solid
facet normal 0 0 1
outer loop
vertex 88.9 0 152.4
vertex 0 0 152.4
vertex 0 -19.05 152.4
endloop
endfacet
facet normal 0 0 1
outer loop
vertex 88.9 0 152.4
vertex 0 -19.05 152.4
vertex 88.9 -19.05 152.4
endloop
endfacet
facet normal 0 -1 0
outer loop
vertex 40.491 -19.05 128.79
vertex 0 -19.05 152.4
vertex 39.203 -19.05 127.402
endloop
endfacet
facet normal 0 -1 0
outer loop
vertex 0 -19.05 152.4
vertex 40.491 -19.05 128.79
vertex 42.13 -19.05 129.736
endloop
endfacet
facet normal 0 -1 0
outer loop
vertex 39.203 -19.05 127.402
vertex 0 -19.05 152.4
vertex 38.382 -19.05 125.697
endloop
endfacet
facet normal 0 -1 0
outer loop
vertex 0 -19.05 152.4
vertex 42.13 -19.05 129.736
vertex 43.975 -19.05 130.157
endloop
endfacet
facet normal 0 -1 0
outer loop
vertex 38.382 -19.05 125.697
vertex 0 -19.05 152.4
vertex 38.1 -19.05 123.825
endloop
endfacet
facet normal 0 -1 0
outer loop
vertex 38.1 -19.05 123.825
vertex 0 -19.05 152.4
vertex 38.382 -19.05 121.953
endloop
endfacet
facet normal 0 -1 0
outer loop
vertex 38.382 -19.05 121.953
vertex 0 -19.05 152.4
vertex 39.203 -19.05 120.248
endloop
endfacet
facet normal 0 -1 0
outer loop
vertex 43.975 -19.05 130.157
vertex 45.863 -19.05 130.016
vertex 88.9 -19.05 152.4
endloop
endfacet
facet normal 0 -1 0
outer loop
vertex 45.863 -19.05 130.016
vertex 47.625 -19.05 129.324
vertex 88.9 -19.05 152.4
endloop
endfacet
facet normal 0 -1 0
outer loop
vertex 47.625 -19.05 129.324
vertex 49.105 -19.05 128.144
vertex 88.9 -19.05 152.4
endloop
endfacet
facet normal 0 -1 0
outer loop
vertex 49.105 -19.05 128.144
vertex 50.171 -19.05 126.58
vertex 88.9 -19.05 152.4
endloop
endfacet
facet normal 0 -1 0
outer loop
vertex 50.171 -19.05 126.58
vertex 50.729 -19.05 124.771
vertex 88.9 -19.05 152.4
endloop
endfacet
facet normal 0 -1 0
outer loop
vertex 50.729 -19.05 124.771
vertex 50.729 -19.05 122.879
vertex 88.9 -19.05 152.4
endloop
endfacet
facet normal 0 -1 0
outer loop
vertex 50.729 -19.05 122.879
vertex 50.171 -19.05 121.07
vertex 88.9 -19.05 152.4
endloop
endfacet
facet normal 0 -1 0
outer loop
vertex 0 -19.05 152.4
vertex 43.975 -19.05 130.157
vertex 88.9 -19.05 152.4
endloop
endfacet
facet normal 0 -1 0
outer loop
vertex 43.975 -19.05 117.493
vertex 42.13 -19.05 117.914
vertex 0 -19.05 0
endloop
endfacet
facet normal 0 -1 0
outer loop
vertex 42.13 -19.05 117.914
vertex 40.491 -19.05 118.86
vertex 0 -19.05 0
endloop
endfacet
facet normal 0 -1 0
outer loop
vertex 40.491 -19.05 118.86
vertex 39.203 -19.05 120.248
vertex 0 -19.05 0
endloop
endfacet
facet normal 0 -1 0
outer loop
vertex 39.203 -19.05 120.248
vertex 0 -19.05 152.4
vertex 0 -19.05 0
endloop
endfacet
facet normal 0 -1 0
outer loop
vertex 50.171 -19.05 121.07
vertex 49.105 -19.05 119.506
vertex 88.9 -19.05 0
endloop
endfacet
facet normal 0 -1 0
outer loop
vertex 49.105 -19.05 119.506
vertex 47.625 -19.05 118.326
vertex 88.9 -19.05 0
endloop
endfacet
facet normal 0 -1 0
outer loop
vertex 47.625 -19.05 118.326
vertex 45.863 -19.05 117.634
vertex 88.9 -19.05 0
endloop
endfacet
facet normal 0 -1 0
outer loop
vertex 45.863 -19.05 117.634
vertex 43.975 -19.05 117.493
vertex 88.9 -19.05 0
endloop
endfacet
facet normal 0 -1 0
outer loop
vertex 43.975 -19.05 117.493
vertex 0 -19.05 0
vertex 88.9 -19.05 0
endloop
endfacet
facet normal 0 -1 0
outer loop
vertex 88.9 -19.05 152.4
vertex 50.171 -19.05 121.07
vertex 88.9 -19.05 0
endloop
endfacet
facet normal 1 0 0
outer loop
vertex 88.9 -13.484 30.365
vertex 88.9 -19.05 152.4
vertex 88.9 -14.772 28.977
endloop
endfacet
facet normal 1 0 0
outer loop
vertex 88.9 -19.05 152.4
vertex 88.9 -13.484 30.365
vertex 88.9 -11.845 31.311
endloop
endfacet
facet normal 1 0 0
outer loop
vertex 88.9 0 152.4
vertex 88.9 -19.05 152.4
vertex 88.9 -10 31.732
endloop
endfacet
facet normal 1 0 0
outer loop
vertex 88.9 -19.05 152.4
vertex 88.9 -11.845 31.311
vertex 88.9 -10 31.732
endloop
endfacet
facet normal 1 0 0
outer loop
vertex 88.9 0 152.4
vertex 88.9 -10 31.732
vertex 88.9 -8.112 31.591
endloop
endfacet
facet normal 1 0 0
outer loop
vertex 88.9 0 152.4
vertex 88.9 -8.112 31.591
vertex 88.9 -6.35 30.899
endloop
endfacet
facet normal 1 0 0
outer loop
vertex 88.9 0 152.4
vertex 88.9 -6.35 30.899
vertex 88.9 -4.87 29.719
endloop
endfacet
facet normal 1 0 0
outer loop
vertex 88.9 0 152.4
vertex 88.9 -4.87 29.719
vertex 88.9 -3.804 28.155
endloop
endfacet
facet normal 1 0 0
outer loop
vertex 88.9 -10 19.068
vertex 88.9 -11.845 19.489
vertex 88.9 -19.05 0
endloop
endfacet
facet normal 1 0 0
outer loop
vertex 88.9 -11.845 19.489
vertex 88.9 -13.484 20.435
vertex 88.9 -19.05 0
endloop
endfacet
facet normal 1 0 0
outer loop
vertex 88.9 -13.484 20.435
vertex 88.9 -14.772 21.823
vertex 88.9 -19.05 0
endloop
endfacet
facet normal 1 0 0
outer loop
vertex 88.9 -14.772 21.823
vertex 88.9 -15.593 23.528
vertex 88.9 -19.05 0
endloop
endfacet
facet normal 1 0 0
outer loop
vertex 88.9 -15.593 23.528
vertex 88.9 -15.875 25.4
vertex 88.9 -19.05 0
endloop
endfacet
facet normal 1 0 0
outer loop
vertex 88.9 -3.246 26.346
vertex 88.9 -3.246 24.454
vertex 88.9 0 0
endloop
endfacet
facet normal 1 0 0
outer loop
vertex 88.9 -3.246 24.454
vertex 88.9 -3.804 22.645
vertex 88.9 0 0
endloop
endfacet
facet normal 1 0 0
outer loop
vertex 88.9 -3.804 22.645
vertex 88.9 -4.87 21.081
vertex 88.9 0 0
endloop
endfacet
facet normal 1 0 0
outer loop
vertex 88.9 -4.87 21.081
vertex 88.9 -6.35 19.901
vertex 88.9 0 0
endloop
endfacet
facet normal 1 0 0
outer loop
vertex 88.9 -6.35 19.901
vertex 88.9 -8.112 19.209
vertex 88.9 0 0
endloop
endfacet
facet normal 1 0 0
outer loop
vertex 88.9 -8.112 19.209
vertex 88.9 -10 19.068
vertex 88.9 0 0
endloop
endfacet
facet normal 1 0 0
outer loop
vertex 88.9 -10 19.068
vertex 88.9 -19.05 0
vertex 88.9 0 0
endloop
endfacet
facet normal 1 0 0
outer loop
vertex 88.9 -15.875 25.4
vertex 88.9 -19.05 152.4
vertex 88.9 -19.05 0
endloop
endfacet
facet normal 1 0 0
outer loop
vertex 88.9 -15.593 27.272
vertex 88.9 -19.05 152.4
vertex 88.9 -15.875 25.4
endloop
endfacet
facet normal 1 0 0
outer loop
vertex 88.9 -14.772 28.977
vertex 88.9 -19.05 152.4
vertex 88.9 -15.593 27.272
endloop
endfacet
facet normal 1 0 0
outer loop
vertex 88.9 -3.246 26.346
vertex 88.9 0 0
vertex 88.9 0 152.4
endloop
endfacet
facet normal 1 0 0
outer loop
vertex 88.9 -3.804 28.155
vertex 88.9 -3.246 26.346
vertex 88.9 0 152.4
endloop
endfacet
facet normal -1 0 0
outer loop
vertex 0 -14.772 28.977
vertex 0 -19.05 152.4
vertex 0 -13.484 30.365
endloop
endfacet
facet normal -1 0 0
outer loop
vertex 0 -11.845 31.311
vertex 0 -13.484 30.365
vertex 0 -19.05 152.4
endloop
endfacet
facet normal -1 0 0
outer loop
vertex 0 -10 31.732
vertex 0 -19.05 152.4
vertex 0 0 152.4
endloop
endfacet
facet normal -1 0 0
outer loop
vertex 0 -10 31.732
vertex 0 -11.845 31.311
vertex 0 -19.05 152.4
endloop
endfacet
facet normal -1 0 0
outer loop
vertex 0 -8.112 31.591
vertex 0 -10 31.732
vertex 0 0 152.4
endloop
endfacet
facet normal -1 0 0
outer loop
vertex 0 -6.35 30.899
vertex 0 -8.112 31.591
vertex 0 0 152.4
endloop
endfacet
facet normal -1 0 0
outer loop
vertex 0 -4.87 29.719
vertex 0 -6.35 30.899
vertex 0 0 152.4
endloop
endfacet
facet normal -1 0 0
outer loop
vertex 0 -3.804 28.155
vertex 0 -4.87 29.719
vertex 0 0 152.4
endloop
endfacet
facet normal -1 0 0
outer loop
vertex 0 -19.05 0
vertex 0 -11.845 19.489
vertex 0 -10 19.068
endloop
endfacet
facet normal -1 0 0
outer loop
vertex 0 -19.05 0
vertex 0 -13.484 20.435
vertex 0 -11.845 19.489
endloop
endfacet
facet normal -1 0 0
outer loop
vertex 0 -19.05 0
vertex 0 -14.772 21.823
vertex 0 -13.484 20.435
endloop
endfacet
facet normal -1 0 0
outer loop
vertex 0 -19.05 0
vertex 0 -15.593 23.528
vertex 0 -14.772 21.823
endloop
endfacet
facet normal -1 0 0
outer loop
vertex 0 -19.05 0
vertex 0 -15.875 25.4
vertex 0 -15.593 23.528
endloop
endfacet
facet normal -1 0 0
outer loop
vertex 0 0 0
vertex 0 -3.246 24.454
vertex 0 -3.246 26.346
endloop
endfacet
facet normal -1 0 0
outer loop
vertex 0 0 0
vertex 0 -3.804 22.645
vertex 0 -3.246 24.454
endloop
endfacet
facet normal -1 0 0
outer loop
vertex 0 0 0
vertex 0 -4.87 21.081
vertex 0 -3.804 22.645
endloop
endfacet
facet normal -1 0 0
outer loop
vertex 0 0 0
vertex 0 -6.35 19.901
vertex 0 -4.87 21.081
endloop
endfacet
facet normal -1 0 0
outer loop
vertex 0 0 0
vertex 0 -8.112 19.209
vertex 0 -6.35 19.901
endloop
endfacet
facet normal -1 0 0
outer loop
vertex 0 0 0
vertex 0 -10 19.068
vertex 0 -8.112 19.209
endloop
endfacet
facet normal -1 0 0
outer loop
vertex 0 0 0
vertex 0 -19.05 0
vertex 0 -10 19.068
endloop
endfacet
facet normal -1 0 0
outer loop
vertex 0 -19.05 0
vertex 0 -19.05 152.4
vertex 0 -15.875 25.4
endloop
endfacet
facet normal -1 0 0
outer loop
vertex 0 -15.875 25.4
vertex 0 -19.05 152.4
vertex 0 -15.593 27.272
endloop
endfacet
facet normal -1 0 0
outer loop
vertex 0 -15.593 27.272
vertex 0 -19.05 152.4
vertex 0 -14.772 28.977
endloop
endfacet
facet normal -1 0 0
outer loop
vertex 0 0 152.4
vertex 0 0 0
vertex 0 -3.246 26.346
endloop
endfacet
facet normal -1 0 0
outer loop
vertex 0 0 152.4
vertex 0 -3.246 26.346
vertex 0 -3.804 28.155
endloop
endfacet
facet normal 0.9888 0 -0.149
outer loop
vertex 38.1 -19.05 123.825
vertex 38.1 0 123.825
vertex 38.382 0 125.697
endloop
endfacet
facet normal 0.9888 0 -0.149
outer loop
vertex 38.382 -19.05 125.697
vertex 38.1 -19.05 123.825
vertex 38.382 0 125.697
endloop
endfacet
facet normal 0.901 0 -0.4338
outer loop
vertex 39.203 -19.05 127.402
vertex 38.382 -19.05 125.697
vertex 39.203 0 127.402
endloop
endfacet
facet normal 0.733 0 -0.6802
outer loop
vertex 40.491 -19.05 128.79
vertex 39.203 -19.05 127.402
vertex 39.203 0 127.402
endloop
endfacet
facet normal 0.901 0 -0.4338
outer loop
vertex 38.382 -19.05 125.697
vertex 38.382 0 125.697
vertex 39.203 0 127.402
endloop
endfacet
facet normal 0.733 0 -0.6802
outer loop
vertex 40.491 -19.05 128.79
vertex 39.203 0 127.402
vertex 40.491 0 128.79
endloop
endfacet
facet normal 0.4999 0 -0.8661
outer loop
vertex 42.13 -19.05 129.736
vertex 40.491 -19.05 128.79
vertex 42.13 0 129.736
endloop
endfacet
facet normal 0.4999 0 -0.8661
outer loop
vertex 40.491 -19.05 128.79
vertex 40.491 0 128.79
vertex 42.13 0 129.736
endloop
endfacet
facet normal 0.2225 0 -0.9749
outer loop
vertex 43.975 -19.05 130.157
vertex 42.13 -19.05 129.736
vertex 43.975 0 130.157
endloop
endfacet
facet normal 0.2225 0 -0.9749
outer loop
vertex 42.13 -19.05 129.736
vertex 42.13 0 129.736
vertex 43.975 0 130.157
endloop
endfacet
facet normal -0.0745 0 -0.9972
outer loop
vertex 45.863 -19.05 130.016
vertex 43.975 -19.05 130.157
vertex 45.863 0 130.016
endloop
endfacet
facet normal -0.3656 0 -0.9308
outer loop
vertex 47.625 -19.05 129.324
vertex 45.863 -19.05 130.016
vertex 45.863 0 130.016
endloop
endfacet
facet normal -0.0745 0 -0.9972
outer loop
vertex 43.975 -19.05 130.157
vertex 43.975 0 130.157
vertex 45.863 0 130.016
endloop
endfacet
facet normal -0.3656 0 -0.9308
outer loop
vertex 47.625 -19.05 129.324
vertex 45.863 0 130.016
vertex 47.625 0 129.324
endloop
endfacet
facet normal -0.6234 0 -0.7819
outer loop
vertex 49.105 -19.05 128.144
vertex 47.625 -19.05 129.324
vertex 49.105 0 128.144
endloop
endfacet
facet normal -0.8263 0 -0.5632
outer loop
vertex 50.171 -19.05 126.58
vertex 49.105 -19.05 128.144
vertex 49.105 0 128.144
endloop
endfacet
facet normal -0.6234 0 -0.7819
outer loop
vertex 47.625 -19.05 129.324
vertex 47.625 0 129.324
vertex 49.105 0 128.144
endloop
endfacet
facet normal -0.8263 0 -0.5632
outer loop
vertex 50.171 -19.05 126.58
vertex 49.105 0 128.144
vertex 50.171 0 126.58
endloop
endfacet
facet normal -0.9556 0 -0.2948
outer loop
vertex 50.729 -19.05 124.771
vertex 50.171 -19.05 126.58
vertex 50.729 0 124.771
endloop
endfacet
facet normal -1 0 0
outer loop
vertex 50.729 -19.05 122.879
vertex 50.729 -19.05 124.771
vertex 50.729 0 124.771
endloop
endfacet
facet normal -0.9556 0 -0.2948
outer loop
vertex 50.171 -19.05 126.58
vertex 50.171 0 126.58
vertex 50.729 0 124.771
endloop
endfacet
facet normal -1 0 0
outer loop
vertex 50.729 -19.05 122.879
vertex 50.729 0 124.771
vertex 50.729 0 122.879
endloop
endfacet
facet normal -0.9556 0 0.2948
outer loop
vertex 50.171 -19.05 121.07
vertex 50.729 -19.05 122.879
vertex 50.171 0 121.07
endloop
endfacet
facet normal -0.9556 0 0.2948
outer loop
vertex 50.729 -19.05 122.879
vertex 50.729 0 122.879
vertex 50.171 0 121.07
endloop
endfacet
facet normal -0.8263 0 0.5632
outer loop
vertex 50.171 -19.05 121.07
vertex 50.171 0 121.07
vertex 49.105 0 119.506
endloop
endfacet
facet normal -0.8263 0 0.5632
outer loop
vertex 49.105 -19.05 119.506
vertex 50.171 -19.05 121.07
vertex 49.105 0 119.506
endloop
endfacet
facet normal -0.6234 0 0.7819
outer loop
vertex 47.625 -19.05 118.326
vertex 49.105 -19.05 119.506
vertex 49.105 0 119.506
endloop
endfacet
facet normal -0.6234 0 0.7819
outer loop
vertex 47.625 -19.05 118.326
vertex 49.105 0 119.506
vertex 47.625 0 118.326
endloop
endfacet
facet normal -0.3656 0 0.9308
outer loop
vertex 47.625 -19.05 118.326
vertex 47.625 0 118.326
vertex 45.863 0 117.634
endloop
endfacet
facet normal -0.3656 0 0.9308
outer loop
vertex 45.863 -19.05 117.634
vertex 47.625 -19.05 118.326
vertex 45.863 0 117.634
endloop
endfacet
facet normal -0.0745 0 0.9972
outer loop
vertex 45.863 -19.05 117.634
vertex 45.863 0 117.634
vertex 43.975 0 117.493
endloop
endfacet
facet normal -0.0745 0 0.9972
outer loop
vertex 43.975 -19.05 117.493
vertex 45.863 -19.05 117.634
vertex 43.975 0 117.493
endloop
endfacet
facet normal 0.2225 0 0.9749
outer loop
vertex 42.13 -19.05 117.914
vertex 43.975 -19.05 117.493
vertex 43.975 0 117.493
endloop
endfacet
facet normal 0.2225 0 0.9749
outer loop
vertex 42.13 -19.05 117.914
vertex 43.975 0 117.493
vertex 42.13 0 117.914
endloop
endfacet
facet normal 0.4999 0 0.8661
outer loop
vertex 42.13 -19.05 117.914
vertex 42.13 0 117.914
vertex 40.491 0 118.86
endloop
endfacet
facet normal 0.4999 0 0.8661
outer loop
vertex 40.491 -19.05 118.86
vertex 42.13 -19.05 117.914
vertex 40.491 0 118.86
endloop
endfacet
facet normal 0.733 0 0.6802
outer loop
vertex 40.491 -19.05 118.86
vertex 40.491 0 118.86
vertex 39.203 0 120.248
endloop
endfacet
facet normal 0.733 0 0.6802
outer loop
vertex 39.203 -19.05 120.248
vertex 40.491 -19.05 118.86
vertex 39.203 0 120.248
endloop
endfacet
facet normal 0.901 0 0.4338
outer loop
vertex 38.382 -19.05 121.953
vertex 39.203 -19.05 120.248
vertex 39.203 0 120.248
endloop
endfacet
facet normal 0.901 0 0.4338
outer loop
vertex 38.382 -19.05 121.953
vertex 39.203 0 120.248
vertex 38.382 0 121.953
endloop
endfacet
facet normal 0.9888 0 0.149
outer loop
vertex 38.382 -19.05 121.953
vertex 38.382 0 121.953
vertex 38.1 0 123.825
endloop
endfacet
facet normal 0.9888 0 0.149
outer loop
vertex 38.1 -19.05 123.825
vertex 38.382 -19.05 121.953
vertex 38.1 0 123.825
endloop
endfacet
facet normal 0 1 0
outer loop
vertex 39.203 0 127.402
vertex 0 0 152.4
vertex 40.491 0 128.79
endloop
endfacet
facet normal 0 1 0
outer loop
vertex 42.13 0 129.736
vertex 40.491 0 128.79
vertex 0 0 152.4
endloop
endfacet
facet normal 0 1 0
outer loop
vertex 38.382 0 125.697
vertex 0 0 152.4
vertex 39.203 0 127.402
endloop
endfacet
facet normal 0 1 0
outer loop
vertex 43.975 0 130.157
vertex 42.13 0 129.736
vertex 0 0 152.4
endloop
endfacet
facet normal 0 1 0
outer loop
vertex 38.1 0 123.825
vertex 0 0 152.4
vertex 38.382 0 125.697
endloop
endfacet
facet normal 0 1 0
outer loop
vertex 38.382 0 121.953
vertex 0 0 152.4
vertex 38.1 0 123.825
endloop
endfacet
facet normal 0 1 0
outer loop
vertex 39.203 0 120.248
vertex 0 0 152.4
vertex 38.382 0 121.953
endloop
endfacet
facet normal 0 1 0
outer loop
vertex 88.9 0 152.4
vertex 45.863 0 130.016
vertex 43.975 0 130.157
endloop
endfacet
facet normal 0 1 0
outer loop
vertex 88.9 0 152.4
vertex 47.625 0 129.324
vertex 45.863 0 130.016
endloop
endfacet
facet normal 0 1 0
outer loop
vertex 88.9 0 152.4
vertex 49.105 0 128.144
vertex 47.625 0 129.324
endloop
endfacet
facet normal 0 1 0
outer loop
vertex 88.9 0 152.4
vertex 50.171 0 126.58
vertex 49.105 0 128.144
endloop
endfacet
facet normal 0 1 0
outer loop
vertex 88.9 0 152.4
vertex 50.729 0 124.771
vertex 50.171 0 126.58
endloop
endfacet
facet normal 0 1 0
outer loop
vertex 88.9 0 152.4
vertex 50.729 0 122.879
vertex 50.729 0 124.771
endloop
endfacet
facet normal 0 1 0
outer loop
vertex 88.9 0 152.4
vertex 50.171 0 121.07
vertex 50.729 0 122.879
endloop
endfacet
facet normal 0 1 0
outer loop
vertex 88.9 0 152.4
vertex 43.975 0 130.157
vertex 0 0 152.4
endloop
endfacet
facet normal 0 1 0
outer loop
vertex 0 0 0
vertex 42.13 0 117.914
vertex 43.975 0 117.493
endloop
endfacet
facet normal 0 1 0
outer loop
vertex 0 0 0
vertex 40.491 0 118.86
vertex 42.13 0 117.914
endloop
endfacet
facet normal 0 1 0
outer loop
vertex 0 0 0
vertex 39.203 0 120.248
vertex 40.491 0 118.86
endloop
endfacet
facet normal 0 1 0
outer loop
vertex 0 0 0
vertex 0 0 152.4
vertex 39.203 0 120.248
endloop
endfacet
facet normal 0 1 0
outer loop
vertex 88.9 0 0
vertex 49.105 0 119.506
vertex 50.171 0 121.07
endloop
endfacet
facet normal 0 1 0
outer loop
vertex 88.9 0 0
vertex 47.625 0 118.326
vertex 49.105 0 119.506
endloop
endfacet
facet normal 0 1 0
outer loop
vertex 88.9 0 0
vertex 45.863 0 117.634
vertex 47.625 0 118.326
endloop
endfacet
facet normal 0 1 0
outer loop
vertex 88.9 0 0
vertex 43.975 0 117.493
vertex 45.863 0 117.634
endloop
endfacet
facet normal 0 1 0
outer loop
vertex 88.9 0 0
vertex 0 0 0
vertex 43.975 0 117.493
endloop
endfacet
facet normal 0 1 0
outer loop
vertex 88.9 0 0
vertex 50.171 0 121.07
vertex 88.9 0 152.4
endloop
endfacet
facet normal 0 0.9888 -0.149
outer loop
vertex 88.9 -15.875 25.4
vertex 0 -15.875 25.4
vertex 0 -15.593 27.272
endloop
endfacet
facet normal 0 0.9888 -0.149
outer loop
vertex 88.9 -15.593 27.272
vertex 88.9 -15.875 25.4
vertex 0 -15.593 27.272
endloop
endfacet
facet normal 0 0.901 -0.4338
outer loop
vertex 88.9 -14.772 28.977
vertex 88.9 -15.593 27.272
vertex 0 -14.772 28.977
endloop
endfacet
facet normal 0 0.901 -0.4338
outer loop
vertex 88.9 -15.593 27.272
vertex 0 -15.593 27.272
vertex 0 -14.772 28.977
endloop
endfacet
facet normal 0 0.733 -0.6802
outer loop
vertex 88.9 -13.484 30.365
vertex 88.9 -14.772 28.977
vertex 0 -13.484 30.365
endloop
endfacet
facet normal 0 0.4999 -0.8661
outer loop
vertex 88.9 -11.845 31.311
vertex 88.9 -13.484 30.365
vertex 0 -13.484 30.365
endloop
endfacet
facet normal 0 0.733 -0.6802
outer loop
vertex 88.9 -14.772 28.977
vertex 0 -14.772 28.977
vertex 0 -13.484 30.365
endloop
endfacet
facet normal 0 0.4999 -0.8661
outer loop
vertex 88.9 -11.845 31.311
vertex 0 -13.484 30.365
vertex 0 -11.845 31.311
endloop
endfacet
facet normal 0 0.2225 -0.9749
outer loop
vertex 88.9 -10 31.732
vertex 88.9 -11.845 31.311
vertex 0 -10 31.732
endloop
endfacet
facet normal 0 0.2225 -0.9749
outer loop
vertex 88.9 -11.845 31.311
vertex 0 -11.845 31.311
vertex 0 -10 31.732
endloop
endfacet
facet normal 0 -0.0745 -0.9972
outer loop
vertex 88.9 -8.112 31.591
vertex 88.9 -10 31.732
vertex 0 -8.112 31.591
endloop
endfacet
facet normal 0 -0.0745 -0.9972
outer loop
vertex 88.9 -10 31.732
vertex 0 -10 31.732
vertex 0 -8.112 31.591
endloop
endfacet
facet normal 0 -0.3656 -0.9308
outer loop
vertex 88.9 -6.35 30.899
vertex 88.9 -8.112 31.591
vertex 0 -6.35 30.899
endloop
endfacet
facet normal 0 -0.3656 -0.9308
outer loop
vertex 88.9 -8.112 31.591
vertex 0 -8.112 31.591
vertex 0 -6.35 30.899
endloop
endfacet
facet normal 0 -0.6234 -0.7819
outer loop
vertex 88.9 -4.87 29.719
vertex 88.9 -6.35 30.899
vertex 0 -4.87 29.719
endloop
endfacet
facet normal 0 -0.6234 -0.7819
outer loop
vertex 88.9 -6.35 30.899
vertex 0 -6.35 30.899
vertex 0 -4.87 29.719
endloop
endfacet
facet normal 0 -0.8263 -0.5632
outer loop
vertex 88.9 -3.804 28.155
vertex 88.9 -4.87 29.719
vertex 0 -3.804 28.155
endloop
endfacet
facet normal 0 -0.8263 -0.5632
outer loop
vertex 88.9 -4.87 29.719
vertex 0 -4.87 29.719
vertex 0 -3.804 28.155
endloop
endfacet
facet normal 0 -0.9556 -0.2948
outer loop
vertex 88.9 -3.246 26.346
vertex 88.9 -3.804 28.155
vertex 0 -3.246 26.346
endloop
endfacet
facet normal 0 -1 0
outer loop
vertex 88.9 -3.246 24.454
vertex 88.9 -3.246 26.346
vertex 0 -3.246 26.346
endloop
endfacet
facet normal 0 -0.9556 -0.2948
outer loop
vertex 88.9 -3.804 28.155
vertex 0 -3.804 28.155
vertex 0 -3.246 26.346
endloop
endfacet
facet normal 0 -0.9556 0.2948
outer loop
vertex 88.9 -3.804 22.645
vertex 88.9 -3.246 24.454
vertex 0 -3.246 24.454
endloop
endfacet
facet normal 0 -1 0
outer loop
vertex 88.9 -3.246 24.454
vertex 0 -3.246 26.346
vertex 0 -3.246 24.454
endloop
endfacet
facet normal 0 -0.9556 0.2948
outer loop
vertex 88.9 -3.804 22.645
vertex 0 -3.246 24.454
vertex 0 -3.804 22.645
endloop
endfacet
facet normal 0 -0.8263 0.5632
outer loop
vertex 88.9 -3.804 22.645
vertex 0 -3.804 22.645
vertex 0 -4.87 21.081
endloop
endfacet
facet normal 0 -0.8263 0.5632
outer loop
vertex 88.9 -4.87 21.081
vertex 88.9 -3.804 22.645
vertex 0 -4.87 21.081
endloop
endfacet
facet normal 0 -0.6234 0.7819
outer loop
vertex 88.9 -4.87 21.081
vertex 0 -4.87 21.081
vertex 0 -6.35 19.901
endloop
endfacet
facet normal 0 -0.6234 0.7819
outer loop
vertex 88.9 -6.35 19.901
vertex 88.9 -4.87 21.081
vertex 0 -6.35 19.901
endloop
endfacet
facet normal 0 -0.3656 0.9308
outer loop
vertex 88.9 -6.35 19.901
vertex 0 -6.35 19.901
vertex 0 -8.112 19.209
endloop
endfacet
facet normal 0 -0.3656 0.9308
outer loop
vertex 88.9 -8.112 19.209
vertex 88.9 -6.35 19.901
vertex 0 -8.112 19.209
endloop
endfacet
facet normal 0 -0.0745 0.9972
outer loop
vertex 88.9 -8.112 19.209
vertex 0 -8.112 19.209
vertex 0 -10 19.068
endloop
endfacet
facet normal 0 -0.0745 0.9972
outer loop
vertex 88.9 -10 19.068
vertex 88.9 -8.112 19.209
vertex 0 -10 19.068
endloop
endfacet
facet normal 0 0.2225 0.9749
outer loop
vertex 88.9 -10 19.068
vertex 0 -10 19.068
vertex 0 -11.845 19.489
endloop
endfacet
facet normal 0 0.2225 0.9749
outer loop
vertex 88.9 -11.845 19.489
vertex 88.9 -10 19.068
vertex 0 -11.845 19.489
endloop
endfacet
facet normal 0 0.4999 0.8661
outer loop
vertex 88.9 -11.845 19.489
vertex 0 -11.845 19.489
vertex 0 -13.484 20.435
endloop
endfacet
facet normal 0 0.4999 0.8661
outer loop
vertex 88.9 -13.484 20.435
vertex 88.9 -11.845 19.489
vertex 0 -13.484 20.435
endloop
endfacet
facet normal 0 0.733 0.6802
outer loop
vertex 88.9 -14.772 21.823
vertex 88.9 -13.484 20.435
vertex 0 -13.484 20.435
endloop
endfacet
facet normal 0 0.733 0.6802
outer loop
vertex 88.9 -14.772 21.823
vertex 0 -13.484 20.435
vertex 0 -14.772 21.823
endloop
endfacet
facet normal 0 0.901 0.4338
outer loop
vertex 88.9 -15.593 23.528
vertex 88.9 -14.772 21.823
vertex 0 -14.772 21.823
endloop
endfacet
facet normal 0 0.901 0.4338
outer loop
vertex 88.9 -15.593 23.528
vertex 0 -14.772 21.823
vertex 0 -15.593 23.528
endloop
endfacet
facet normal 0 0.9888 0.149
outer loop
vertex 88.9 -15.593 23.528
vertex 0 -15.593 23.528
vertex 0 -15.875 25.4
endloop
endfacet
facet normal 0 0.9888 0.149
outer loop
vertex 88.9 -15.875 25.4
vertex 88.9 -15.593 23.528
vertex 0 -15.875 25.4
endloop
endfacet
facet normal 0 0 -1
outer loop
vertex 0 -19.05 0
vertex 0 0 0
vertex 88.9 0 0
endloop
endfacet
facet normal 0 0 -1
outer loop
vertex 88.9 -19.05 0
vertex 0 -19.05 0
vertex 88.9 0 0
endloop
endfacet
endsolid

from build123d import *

# Parameters (mm, degrees)
F0_W     = 88.9
F0_H     = 19.05
F1_DEPTH = 152.4
F3_D     = 12.7
F5_D     = 12.7


with BuildPart() as f1:
    # F0 (on Top) → F1 (new body)
    with BuildSketch(Plane.XY):
        with Locations((44.45, -9.525)):
            Rectangle(F0_W, F0_H)
    extrude(amount=F1_DEPTH)

    # F3 (through all)
    with Locations(Plane.XZ.offset(19.05)):
        with Locations((44.45, 123.825)):
            Hole(F3_D / 2)

    # F5 (through all)
    with Locations(Plane.YZ.offset(88.9)):
        with Locations((-9.525, 25.4)):
            Hole(F5_D / 2)


solid = f1.part
